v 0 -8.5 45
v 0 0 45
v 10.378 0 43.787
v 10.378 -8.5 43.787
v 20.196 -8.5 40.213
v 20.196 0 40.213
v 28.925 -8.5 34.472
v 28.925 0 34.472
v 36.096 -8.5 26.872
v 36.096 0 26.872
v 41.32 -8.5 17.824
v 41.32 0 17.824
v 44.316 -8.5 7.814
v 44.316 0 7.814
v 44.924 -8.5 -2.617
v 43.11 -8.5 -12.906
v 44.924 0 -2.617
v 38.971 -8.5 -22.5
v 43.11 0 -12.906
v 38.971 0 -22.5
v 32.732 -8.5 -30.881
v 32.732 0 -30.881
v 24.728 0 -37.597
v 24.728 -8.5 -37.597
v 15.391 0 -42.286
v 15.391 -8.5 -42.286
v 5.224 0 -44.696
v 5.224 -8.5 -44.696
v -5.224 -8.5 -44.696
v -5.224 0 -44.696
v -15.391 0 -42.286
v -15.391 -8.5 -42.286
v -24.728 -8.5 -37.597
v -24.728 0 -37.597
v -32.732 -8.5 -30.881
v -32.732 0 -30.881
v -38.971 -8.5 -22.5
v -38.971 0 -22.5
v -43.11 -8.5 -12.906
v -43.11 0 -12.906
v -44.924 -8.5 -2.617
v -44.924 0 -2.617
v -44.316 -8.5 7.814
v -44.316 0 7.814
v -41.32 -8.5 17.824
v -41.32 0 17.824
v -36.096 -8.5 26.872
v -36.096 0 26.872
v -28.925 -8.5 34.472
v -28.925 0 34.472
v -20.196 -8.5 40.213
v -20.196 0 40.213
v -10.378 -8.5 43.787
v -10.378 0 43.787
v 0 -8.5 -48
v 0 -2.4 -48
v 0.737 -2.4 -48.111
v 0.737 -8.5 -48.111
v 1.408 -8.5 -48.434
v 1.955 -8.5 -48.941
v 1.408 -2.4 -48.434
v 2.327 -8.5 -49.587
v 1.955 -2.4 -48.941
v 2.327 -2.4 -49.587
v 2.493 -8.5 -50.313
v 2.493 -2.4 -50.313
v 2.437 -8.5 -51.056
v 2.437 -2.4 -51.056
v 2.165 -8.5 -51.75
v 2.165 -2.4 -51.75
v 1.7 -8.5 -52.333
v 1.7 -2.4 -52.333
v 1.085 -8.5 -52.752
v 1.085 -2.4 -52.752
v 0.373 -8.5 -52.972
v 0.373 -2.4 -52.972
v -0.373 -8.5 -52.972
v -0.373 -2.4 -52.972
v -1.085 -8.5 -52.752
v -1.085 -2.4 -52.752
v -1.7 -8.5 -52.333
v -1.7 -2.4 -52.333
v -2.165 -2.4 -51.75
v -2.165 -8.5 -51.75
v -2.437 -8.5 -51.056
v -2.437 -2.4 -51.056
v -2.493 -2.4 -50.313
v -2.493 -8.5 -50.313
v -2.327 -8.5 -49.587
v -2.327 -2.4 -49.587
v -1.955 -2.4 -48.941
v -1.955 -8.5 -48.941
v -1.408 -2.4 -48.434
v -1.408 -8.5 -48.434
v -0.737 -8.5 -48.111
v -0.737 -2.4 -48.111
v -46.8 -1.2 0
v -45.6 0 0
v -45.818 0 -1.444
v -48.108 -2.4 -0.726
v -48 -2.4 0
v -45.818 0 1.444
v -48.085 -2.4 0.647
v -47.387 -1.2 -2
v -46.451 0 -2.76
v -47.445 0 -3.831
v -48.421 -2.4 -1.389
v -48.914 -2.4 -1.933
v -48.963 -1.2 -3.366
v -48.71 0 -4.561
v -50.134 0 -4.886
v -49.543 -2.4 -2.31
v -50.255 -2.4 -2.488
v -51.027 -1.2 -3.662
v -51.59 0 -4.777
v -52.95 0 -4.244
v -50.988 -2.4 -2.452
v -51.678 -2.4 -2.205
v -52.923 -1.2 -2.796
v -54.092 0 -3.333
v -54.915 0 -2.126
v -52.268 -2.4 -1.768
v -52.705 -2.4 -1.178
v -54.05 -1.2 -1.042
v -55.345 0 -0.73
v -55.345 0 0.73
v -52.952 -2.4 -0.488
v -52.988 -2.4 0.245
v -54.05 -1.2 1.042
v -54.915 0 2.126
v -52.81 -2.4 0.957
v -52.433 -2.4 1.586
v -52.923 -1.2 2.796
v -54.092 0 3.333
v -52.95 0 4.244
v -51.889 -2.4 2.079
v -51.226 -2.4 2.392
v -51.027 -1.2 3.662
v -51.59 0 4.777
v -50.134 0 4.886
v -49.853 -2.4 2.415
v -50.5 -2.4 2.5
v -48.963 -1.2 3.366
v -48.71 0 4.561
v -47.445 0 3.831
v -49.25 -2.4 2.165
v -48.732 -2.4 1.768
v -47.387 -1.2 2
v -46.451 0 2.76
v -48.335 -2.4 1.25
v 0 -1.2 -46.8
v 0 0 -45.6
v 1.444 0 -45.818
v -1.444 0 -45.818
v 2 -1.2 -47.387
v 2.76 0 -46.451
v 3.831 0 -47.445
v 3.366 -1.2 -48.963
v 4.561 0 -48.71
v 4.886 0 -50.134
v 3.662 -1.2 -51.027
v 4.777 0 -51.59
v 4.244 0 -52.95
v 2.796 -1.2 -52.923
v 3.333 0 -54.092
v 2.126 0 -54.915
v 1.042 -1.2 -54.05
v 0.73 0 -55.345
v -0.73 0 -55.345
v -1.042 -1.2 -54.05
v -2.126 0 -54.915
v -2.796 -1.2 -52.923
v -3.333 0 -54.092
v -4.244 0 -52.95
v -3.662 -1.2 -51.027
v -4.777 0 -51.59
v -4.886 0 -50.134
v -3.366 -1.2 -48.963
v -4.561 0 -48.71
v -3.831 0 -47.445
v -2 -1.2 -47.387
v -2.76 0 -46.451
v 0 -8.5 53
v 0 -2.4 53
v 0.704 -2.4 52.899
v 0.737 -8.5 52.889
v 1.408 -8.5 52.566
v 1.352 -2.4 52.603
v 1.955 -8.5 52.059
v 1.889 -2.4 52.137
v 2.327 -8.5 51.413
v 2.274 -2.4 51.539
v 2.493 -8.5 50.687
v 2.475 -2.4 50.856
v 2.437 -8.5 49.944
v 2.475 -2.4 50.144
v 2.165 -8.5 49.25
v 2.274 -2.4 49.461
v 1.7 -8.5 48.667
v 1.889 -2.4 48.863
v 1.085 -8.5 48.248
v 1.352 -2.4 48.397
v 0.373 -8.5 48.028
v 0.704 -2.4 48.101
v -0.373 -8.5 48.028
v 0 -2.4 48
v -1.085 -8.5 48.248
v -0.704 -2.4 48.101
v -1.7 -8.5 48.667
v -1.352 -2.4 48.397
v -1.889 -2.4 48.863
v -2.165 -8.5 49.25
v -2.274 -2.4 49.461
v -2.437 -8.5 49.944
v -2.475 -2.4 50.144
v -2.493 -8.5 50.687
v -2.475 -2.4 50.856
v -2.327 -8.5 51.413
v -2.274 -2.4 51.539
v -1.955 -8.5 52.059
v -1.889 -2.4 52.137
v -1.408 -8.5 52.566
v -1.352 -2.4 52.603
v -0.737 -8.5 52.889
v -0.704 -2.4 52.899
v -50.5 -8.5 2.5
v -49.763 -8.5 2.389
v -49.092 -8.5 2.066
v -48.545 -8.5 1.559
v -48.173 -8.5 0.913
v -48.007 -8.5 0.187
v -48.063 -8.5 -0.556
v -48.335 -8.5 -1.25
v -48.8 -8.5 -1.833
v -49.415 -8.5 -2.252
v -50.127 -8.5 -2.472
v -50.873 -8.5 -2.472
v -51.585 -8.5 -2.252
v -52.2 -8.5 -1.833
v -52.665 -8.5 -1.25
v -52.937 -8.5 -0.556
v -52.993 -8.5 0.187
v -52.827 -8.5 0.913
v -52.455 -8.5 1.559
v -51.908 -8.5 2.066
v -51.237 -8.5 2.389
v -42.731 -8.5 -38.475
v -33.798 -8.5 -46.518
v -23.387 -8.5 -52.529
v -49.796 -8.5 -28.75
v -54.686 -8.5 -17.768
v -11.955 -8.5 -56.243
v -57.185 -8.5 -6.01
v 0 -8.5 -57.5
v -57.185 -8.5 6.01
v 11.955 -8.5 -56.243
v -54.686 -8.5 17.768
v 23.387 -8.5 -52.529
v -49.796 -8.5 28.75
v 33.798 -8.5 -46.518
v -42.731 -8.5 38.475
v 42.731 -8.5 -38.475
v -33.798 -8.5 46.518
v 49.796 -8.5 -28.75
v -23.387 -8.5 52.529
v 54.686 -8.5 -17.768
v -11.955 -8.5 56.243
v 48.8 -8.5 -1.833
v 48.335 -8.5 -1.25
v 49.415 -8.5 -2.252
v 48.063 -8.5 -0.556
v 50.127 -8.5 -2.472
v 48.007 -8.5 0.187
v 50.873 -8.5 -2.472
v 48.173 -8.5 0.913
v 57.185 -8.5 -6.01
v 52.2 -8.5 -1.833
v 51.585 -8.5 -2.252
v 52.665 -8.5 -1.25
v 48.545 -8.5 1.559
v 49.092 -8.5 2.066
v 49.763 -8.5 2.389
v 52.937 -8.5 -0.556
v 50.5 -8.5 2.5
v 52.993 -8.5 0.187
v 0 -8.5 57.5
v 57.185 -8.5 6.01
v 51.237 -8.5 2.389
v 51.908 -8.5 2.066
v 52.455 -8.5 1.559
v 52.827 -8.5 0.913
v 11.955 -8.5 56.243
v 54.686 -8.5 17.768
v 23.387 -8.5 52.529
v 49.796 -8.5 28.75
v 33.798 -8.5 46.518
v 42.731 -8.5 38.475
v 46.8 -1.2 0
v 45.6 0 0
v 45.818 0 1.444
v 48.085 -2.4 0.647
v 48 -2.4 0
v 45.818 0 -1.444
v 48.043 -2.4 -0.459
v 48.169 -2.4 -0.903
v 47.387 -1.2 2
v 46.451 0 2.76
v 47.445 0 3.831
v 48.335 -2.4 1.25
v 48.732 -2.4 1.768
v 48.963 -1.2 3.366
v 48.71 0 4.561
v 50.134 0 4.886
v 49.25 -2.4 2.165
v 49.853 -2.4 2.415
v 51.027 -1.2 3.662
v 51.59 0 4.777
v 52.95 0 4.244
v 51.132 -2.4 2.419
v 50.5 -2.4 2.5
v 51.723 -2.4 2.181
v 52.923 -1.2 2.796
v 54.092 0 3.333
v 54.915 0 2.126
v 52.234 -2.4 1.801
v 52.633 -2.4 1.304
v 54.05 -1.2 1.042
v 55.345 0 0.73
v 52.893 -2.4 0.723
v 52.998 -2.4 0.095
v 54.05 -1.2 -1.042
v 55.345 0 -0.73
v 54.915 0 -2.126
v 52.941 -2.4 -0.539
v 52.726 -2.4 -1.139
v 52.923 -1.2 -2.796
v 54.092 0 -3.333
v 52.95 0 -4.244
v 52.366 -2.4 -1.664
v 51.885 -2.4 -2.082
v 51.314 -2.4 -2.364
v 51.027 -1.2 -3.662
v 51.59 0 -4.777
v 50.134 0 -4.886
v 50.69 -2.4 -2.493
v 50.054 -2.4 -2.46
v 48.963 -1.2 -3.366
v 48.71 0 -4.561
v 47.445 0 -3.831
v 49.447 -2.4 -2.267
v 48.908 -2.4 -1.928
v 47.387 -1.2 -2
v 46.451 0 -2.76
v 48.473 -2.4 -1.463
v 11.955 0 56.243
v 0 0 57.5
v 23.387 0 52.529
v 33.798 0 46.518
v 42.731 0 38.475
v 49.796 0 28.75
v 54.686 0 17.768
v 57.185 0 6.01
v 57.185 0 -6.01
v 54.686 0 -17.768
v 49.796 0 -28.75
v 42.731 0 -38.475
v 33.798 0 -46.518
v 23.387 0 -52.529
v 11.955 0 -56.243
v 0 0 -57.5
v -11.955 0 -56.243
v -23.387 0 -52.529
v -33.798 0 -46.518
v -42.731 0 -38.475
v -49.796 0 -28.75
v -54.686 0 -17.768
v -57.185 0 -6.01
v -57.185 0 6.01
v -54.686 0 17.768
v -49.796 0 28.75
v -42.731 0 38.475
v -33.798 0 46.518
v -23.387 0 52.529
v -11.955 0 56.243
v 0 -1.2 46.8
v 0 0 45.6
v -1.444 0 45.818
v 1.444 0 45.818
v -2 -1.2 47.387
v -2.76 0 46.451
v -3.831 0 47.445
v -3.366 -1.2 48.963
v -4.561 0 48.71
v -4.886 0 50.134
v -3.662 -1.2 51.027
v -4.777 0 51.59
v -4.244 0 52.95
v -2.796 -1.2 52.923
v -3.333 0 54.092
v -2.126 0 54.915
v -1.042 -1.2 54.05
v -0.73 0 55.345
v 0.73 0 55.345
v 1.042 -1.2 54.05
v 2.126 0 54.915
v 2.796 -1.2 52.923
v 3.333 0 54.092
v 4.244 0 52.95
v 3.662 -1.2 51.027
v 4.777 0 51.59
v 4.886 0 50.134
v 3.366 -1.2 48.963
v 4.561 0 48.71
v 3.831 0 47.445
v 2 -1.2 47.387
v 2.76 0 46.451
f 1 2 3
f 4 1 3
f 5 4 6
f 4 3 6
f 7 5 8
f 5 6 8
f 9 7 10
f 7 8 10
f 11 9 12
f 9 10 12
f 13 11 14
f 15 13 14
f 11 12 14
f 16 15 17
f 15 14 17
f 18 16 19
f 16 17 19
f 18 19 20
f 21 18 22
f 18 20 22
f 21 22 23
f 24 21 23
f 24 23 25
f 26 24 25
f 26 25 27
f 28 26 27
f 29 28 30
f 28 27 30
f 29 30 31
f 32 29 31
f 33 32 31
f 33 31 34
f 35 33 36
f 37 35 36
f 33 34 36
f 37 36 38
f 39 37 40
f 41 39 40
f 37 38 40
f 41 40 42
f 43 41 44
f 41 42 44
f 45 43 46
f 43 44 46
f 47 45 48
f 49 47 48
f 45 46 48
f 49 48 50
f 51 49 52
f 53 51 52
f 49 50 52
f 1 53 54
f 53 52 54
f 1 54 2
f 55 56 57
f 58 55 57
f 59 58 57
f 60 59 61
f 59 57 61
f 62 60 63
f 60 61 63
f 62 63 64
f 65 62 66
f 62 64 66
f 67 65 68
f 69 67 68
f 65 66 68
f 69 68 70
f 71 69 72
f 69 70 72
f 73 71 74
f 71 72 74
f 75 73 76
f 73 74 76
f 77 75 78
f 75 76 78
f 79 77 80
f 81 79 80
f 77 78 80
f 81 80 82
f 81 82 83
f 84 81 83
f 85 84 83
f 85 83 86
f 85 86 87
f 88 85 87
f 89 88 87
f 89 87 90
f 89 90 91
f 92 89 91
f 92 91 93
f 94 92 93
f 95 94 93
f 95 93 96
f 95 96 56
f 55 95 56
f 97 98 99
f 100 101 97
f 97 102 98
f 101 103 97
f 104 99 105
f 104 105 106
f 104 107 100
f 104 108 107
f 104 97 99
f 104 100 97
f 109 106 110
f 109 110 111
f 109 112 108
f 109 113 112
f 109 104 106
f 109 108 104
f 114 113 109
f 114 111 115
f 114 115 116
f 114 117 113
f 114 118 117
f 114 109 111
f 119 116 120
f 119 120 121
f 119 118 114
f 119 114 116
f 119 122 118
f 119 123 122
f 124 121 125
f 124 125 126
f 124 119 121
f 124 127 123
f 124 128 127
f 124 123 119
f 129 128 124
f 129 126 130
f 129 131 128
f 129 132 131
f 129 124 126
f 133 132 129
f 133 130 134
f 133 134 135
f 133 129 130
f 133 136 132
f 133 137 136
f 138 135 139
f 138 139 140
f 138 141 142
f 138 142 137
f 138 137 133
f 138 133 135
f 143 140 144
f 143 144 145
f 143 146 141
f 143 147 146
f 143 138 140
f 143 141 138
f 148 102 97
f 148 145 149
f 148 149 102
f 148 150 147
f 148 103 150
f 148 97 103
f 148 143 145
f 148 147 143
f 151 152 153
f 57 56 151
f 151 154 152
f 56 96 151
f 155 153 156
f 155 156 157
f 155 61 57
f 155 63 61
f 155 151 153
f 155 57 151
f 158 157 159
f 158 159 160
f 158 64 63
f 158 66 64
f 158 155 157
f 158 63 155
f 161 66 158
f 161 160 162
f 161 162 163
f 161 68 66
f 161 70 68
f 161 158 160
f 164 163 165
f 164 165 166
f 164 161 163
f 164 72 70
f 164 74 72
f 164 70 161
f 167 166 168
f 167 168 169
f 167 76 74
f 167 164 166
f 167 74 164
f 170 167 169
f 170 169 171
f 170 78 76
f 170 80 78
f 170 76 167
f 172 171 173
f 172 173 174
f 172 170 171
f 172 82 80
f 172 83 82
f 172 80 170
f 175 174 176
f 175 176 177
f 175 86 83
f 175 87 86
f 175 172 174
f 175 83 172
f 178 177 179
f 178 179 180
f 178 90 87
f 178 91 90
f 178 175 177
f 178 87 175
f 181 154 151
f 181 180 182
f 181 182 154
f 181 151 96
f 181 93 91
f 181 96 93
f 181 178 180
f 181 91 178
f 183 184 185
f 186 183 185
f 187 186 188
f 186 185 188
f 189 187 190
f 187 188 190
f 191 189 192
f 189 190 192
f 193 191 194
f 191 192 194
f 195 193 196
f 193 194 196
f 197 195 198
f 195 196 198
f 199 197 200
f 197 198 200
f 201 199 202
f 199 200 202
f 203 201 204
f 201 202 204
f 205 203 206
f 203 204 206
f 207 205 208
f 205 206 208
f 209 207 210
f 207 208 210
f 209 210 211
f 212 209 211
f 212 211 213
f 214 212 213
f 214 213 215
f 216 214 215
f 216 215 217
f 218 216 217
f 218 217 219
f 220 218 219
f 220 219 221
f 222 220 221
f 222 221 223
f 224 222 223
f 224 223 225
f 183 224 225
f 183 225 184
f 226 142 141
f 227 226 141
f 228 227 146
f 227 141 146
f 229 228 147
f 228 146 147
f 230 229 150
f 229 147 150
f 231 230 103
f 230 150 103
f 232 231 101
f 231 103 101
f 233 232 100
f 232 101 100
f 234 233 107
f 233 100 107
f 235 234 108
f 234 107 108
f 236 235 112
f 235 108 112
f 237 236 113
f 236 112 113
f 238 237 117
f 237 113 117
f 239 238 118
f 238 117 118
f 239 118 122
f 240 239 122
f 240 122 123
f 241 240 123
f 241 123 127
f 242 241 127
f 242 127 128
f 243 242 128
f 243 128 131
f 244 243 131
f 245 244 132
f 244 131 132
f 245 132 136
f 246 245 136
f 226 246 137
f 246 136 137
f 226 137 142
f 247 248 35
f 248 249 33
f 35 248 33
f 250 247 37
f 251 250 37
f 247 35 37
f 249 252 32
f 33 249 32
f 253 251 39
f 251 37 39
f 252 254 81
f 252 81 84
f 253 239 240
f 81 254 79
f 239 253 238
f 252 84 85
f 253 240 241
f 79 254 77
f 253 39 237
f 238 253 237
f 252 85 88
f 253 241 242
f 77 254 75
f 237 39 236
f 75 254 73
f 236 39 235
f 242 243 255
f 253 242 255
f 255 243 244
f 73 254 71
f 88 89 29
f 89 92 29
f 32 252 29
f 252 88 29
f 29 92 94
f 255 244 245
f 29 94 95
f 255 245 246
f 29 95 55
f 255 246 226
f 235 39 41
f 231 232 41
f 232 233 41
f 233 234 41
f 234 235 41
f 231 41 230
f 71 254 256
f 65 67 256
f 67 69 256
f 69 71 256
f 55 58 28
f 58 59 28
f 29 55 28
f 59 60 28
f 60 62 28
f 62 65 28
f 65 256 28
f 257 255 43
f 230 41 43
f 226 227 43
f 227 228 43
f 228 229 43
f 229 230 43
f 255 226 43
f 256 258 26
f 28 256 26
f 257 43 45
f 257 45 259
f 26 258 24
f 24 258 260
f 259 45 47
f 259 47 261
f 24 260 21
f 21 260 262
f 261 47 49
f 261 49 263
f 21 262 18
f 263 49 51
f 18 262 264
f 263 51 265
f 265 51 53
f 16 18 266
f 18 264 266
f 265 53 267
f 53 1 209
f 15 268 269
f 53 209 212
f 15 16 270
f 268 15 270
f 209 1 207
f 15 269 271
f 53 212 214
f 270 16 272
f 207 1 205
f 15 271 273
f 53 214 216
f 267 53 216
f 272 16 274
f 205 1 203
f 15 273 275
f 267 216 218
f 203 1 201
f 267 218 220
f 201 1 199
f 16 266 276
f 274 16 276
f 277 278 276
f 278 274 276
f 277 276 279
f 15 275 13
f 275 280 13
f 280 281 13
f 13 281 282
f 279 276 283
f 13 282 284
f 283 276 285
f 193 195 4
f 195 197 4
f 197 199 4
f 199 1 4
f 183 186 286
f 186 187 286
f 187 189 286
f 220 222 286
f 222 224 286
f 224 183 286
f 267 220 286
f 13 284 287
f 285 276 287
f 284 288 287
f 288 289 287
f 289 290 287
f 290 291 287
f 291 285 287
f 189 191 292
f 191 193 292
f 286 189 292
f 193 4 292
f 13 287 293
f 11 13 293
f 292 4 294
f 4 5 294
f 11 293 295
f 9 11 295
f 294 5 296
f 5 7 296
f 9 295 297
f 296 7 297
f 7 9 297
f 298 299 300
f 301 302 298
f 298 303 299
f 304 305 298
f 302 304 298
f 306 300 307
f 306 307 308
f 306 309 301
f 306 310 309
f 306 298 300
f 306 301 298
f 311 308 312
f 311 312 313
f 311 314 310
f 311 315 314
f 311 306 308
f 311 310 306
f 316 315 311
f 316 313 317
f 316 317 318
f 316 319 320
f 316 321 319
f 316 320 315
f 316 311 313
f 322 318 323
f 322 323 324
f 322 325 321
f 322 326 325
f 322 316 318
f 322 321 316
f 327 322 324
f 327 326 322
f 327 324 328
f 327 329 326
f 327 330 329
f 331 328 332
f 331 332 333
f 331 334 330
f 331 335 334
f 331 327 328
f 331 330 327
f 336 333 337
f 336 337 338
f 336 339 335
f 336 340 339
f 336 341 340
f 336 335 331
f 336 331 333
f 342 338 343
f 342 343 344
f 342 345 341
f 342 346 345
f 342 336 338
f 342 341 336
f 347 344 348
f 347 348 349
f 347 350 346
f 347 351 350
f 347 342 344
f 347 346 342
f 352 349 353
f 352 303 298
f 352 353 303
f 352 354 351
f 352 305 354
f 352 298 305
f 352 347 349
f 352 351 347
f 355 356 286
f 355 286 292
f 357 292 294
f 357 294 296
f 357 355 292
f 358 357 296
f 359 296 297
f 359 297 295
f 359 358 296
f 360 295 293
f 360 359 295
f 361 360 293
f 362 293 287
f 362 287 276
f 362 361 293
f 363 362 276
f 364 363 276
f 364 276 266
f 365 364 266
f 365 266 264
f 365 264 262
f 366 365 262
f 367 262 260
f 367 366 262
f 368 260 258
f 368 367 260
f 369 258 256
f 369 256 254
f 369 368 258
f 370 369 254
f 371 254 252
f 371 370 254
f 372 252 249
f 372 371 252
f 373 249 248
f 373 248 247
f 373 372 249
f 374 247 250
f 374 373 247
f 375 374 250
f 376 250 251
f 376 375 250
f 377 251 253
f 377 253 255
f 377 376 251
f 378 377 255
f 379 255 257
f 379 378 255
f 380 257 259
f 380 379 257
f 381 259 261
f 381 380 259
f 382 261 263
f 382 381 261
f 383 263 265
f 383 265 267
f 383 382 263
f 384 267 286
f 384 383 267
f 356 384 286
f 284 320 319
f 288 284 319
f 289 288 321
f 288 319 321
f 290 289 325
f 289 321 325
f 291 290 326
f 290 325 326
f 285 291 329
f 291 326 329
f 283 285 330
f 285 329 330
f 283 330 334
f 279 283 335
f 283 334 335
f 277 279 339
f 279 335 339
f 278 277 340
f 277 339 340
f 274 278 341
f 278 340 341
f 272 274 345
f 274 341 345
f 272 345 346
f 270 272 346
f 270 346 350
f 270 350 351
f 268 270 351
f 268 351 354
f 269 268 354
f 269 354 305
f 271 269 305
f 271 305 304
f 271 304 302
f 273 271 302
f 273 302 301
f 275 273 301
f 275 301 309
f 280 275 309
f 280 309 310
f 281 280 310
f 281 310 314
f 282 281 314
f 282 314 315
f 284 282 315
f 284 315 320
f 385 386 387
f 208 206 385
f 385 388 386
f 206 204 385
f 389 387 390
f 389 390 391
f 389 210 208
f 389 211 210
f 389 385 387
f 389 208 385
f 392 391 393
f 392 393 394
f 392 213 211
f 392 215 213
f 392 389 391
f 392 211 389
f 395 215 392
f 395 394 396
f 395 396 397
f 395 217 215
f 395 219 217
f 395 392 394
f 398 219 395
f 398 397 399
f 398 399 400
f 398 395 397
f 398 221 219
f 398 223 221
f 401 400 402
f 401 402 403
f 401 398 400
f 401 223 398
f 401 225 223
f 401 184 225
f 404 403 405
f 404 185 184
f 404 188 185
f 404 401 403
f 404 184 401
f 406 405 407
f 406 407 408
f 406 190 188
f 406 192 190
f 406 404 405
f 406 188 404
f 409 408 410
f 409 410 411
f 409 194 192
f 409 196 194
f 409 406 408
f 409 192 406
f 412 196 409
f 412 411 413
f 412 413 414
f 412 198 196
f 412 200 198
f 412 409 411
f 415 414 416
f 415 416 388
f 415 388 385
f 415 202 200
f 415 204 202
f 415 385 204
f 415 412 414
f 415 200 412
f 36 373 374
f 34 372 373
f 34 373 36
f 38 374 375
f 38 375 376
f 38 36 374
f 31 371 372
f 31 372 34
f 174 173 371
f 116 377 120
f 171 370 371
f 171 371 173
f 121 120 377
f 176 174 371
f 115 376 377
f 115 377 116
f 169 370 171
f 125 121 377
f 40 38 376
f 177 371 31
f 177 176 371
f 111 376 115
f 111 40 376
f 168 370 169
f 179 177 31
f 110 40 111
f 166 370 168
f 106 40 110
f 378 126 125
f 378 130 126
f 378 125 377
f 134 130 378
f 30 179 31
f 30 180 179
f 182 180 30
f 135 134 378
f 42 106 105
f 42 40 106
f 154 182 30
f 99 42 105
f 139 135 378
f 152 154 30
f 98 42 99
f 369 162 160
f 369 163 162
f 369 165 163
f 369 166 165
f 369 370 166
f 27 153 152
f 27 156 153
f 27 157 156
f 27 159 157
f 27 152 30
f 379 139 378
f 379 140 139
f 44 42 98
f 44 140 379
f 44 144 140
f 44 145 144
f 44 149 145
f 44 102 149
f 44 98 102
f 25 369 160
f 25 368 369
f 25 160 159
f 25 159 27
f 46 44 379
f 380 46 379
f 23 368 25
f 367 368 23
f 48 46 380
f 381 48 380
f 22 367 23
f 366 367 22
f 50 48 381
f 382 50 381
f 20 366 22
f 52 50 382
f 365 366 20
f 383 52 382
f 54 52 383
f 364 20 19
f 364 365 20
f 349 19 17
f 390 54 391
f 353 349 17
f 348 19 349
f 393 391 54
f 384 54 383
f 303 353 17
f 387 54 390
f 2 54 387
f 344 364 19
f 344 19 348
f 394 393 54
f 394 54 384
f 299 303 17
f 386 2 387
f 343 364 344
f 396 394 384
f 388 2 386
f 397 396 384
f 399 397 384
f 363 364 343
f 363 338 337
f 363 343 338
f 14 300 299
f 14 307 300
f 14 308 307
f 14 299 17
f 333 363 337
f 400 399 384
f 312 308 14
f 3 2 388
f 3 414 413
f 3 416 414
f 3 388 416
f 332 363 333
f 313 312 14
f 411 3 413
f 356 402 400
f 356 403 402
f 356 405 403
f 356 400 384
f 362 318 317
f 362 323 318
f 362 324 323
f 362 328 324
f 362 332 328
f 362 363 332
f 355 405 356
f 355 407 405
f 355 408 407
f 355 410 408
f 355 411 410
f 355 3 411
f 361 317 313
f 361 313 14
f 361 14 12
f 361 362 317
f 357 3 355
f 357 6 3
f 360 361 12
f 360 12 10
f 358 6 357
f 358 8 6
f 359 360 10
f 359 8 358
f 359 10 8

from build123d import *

# Parameters (mm, degrees)
SKETCH_1_R               = 57.5
SKETCH_1_R_2             = 45
SKETCH_1_R_3             = 2.5
EXTRUDE_1_DEPTH          = 8.5
PATTERN_CIRCULAR_1_COUNT = 4


with BuildPart() as part:
    # 草图1 → 凸台-拉伸1 (new body)
    with BuildSketch(Plane(origin=(0, 0, 0), x_dir=(1, 0, 0), z_dir=(0, 1, 0))):
        Circle(SKETCH_1_R)
        Circle(SKETCH_1_R_2, mode=Mode.SUBTRACT)
        with Locations((0, 50.5)):
            Circle(SKETCH_1_R_3, mode=Mode.SUBTRACT)
        with Locations((50.5, 0)):
            Circle(SKETCH_1_R_3, mode=Mode.SUBTRACT)
        with Locations((0, -50.5)):
            Circle(SKETCH_1_R_3, mode=Mode.SUBTRACT)
        with Locations((-50.5, 0)):
            Circle(SKETCH_1_R_3, mode=Mode.SUBTRACT)
    extrude(amount=-EXTRUDE_1_DEPTH)

    # 草图2 → 切除-旋转1 (revolve, cut)
    with BuildSketch(Plane.XY.offset(-50.5)):
        Polygon((0, 0), (4.9, 0), (1.6, -3.3), (0, -3.3), align=None)
    cut_revolve_1 = revolve(axis=Axis((0, -3.3, -50.5), (0, 1, 0)), mode=Mode.SUBTRACT)

    # 阵列(圆周)1: 切除-旋转1 ×4 about axis
    pattern_circular_1_axis = Axis((0, -8.5, 0), (0, 1, 0))
    for i in range(1, PATTERN_CIRCULAR_1_COUNT):
        add(cut_revolve_1.rotate(pattern_circular_1_axis, i * 360 / PATTERN_CIRCULAR_1_COUNT), mode=Mode.SUBTRACT)


solid = part.part
